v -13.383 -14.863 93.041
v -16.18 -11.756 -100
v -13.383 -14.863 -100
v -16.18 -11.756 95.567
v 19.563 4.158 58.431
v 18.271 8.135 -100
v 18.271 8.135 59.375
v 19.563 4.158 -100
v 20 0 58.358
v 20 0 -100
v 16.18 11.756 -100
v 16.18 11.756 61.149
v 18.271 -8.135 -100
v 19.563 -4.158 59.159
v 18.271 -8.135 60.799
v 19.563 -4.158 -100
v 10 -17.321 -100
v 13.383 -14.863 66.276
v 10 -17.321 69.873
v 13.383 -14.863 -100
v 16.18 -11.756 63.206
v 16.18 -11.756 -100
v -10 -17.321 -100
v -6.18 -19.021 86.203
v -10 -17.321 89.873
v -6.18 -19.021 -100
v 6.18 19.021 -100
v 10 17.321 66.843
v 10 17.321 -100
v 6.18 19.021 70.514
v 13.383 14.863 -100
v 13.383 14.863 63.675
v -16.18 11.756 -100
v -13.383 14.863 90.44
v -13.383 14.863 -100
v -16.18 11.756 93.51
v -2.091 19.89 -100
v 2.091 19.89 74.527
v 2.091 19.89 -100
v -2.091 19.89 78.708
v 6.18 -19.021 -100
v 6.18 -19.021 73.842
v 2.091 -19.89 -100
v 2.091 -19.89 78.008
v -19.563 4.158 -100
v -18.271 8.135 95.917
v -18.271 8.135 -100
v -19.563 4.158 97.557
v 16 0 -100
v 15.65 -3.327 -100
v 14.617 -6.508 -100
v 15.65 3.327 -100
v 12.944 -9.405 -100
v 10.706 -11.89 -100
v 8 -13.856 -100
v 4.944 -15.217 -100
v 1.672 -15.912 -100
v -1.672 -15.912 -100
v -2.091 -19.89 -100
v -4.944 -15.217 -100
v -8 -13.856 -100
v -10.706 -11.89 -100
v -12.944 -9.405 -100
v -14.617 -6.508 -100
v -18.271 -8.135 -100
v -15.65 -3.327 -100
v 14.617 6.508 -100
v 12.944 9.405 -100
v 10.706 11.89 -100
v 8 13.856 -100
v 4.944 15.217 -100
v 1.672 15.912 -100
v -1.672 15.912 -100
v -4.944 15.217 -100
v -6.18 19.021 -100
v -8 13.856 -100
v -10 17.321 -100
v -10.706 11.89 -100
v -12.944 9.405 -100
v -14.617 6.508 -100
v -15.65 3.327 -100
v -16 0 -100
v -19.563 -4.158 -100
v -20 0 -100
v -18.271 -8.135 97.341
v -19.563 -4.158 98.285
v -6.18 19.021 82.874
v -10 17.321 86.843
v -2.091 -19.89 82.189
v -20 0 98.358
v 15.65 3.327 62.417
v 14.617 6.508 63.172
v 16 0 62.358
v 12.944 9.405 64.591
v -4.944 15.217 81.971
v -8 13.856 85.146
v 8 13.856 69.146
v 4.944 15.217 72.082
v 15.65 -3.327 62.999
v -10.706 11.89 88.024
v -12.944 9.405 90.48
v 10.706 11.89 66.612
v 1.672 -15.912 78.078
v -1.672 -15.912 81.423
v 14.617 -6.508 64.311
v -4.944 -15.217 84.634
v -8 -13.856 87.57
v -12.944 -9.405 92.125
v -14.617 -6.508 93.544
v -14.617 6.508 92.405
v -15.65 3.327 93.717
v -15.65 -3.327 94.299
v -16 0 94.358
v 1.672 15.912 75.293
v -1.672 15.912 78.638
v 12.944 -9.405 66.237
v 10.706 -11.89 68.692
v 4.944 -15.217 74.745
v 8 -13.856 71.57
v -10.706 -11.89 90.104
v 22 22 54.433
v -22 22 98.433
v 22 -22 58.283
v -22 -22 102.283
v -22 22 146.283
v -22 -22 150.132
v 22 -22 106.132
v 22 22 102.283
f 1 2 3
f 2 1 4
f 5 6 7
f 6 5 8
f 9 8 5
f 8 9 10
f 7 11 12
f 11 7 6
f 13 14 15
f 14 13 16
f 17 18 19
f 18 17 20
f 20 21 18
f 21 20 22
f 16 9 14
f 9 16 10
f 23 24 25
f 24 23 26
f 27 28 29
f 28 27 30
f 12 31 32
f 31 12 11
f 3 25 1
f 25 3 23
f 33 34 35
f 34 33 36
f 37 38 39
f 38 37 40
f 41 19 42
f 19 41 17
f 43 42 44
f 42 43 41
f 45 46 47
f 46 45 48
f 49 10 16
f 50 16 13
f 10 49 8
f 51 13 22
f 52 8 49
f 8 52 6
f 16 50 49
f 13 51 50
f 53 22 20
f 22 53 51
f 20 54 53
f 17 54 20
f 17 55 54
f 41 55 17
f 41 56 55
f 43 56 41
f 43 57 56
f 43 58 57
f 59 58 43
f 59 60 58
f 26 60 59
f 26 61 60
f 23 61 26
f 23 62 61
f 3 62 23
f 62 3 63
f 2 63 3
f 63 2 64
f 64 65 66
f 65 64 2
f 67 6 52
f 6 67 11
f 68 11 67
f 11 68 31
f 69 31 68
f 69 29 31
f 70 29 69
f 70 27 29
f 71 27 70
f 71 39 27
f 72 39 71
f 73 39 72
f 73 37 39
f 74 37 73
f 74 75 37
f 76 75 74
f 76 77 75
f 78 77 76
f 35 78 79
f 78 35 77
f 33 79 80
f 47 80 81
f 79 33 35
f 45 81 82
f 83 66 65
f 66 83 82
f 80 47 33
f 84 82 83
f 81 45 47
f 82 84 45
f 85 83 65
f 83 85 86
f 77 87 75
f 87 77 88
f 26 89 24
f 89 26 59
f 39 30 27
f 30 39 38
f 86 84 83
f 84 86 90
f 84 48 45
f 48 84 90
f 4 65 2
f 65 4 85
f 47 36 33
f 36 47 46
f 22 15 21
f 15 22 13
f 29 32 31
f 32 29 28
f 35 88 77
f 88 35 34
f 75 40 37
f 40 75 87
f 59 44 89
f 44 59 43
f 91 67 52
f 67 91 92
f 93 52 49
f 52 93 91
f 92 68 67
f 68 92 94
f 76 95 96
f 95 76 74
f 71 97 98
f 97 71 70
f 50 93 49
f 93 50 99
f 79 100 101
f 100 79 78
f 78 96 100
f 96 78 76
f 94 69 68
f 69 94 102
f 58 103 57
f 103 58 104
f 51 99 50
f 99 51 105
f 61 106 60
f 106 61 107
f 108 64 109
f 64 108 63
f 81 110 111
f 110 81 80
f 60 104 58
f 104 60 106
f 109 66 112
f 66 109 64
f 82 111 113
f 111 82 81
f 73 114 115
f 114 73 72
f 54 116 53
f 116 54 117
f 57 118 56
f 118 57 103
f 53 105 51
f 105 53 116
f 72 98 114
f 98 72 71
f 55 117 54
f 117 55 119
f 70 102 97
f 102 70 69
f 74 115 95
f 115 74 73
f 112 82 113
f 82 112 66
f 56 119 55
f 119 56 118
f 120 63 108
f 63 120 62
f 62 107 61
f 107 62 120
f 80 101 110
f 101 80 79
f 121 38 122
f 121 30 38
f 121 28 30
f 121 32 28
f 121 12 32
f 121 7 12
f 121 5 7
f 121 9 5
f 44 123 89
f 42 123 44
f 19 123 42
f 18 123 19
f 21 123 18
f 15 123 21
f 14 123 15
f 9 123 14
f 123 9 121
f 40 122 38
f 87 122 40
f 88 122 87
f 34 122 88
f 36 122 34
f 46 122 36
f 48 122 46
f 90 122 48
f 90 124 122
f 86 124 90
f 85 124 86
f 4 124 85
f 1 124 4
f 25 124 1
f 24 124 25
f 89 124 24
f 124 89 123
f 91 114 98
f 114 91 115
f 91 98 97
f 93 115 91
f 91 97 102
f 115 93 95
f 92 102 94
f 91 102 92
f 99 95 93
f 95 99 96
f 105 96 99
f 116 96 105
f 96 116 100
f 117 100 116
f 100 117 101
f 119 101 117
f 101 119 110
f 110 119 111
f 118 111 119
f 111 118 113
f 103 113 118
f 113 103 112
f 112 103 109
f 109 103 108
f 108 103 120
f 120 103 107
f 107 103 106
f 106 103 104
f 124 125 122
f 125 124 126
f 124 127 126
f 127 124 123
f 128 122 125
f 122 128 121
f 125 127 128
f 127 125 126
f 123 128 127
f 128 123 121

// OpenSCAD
// file: ends.scad
/* AVR-CNC angled endings */

module ends(dim = [1, 1, 1], a = [[0, 0], [0, 0]]) {
  l = dim[0];
  w = dim[1];
  h = dim[2];

  for (i = [0 : 1]) {
    if (a[i] != [0, 0]) {
      q = 1.1;
      w2 = w / 2 * q;
      h2 = h / 2 * q;

      wt = w * tan(a[i][0]) * q;
      ht = h * tan(a[i][1]) * q;

      l2 = (l + w * tan(a[i][0]) * (q - 1) + h * tan(a[i][1]) * (q - 1)) / 2 +
        (wt < 0 ? wt / q : 0) + (ht < 0 ? ht / q : 0);
      
      lm = l2 + abs(ht) + abs(wt);

      m = i == 0 ? 1 : -1;
      
      top =    [[-w2, -h2, m * (lm)], [w2, -h2, m * (lm - wt)],
                [w2,  h2,  m * (lm - wt - ht)], [-w2, h2, m * (lm - ht)]];
      bottom = [[-w2, -h2, m * (l2)], [w2, -h2, m * (l2 - wt)],
                [w2,  h2,  m * (l2 - wt - ht)], [-w2, h2, m * (l2 - ht)]];
      
      points = i == 0 ? concat(bottom, top) : concat (top, bottom);

      polyhedron(points = points,
        faces = [[0, 1, 2, 3], [0, 3, 7, 4],
                 [5, 6, 2, 1], [4, 5, 1, 0],
                 [6, 7, 3, 2], [7, 6, 5, 4]],
        convexity = 1);
    }
  }
  
}
// main file
/* AVR-CNC pipe */

include <ends.scad>;

module pipe(l = 100, dim = [20, 16], a = [[0, 0], [0, 0]], rot = [0, 0, 0], pos = [0, 0, 0]) {
  R = dim[0];
  r = dim[1];

  translate(pos) {
    rotate(rot) {
      difference() {
        cylinder(h = l, r = R, center = true);
        cylinder(h = l + 1, r = r, center = true);
        
        //ends(dim = [l, 2 * R, 2 * R], a = a);
      }
      translate([0, 0, tan(a[0][0]) * tan(a[0][1]) * R * sin(a[0][0]) * sin(a[0][1])]) {
        #ends(dim = [l, 2 * R, 2 * R], a = a);
      }
    }
  }

}

pipe(l = 200, a = [[45, 5], [0, 0]]);
